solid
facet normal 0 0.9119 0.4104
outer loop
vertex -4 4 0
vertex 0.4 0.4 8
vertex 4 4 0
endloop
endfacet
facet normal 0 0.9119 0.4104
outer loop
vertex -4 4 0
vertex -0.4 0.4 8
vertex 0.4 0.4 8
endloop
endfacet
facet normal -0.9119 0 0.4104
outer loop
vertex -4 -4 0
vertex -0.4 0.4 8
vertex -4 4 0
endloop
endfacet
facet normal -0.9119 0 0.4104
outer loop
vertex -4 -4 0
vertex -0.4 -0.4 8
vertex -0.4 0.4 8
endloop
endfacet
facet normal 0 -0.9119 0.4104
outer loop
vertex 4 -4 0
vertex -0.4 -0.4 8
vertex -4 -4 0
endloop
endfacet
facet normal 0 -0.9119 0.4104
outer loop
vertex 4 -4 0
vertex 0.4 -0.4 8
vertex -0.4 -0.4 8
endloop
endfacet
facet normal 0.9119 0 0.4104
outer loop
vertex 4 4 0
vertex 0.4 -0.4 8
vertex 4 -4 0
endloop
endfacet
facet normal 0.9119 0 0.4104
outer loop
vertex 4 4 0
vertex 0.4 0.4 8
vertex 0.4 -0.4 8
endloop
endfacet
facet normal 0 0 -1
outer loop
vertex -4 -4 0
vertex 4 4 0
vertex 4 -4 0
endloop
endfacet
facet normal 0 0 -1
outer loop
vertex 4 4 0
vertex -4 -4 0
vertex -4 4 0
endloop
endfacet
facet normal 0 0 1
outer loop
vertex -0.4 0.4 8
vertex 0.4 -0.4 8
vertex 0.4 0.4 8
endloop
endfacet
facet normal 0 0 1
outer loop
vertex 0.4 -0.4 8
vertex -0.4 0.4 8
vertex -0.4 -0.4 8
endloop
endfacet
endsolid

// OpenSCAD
// studs/pyramid.scad — classic 4-sided pyramid.
// MIT licensed.
//
// Module contract (see CONTRIBUTING.md):
//   stud_pyramid(size, tip_radius, height)
//   - origin at base center, axis along +Z, base on z=0
//
// LEARNING-MODE NOTE: there are three reasonable ways to build a pyramid in
// OpenSCAD. We use `cylinder($fn=4)` because tip_radius drops in cleanly as
// the top radius. Alternatives if you want to revisit:
//   (a) polyhedron with explicit vertices  — most control, no fillet support
//   (b) hull() over a square base and a point — clean, harder to flatten tip
//   (c) minkowski() of (a) with a small sphere — true fillet, slow render

module stud_pyramid(size = 6, tip_radius = 0.4, height = undef) {
    h = is_undef(height) ? size : height;

    // cylinder $fn=4 produces a 4-sided prism. To make the *corners* sit at
    // x=±size/2 and y=±size/2, the base radius must be (size/2)*sqrt(2).
    base_r = (size / 2) * sqrt(2);
    top_r  = tip_radius > 0 ? tip_radius * sqrt(2) : 0;

    rotate([0, 0, 45])
        cylinder(h = h, r1 = base_r, r2 = top_r, $fn = 4);
}

// development render
stud_pyramid(size = 8, tip_radius = 0.4);
